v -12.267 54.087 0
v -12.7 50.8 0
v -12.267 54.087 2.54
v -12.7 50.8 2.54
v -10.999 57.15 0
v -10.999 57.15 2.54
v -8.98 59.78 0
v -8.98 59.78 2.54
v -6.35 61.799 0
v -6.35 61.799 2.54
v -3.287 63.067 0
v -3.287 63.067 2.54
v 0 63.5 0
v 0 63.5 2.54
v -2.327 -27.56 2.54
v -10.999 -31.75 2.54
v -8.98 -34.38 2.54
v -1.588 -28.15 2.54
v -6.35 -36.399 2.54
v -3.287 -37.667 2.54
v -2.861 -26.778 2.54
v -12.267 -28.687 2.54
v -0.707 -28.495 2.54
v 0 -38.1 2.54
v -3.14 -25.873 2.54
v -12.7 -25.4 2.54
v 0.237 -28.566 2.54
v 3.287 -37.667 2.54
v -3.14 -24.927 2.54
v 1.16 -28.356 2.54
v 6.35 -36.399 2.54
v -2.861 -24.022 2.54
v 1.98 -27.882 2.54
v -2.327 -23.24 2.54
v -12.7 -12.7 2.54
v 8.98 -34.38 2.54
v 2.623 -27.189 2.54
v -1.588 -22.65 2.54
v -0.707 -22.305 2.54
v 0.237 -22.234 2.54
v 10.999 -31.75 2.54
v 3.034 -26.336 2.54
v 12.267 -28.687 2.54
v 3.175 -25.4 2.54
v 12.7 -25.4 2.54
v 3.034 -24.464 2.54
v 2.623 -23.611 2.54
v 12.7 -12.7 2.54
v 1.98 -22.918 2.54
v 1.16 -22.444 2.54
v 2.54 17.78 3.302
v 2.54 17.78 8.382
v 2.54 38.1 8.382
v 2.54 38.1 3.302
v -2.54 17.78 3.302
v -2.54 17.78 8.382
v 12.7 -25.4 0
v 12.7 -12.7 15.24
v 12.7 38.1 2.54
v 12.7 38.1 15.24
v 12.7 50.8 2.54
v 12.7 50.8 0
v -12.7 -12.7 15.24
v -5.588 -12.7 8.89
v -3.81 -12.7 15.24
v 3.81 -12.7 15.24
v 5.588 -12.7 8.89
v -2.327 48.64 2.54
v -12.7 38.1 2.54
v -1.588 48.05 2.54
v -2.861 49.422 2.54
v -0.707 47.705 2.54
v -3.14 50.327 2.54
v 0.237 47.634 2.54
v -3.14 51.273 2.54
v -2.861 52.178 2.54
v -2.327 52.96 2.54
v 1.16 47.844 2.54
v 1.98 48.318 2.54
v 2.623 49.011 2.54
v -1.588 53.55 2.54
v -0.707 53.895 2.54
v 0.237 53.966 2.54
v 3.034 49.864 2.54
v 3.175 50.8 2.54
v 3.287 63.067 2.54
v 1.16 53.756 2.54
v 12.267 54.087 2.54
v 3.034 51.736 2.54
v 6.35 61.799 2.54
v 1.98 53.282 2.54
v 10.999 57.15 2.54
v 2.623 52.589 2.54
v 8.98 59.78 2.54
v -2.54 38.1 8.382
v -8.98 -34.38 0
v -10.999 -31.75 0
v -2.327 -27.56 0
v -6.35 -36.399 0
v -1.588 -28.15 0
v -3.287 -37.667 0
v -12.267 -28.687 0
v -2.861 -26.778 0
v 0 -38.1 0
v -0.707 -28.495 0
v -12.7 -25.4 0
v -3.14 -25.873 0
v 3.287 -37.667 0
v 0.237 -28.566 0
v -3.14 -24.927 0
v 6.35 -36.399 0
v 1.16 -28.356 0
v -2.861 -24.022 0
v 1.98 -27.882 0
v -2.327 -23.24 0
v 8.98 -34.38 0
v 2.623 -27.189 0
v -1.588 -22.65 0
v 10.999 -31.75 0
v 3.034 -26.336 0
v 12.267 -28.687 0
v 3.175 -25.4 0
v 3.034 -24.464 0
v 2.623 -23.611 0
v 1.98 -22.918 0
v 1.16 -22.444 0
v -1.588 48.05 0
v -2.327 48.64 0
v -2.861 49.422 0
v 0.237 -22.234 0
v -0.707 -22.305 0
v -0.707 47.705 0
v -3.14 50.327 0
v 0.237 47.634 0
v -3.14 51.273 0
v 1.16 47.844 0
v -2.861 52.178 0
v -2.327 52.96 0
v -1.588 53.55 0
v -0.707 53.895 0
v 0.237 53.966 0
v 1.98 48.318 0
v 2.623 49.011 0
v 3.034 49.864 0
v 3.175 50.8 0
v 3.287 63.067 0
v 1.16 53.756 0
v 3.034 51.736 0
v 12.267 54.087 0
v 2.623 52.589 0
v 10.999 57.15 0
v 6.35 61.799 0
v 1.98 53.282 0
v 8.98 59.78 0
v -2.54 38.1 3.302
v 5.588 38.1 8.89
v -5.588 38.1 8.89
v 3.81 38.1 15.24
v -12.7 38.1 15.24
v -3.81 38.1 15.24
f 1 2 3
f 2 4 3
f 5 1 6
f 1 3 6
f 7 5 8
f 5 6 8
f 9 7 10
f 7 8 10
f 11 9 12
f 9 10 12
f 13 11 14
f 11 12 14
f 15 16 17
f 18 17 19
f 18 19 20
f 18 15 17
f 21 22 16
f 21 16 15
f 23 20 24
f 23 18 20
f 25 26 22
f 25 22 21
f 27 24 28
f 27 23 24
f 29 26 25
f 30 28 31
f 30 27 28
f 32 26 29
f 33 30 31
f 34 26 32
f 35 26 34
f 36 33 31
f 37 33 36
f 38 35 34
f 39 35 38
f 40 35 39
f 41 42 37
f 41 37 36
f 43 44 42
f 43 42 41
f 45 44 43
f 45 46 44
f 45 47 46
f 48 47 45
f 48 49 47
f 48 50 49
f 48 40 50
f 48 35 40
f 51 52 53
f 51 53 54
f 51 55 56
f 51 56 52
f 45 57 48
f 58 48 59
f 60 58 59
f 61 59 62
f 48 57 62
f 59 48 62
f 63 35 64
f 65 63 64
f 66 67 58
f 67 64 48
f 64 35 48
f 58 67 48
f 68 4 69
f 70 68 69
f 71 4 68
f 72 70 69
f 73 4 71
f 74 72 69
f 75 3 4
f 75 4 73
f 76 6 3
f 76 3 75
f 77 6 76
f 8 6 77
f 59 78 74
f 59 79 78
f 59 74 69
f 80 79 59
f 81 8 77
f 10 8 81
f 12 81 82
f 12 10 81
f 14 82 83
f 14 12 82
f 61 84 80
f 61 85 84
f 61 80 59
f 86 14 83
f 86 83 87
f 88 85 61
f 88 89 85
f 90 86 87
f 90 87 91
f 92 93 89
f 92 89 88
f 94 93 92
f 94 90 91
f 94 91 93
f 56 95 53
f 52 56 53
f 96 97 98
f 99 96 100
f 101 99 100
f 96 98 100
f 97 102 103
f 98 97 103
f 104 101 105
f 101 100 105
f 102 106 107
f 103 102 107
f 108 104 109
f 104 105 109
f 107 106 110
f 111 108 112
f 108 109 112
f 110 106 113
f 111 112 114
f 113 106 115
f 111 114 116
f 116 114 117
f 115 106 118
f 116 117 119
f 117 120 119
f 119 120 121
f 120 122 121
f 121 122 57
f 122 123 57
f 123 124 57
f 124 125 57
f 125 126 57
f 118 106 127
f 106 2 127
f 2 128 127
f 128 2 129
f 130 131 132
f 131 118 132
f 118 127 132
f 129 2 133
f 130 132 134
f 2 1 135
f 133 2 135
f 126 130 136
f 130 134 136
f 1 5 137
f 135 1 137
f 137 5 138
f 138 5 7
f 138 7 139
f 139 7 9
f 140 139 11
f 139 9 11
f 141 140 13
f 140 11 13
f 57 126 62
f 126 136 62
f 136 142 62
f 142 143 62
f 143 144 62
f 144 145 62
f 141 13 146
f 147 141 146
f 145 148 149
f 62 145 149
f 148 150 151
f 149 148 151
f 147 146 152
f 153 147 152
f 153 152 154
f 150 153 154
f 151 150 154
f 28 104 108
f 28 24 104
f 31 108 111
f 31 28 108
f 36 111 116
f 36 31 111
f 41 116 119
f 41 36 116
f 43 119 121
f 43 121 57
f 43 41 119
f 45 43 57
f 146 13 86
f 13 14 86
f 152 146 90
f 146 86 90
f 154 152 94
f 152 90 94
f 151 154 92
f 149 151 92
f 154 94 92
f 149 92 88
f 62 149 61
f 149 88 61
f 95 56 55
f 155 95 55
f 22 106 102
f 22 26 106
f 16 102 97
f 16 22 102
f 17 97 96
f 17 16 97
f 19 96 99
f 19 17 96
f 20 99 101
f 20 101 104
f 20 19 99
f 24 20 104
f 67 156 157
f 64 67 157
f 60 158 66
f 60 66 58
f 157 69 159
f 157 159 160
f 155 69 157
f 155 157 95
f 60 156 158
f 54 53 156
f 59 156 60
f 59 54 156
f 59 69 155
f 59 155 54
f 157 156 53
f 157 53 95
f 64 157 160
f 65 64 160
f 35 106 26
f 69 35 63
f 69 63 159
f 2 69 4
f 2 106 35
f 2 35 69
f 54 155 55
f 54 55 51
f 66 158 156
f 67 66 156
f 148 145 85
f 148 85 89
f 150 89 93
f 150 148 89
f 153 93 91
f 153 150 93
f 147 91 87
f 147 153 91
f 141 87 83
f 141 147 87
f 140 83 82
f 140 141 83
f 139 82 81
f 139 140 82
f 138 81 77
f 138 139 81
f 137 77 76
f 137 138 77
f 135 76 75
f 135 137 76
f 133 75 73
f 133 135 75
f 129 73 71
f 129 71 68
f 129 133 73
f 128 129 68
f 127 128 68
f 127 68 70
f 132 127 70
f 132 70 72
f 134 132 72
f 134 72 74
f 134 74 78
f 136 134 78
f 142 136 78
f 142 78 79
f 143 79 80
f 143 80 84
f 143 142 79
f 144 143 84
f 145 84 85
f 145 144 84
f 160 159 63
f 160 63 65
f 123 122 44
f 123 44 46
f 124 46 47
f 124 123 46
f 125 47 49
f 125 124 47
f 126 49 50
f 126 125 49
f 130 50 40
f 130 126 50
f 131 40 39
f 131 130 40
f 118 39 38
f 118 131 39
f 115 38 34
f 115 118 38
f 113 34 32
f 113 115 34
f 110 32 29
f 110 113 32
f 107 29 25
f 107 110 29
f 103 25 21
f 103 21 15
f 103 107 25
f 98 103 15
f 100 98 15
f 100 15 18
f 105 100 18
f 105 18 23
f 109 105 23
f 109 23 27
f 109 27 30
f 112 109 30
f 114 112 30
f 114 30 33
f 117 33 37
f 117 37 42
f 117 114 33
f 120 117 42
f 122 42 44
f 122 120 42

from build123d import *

# Parameters (mm, degrees)
SKETCH1_W           = 25.4
SKETCH1_H           = 25.4
SKETCH1_R           = 3.175
SKETCH1_H_2         = 50.8
BOSS_EXTRUDE1_DEPTH = 2.54
SKETCH1_3_W         = 25.4
SKETCH1_3_H         = 50.8
BOSS_EXTRUDE2_DEPTH = 15.24
CUT_EXTRUDE1_DEPTH  = 79.74
FILLET1_R           = 12.7
SKETCH4_W           = 5.08
SKETCH4_H           = 5.08
CUT_EXTRUDE2_DEPTH  = 20.32


with BuildPart() as part:
    # Sketch1 → Boss-Extrude1 (new body)
    # profile 1 of 3: a face of its own
    with BuildSketch(Plane.XY):
        with Locations((0, 50.8)):
            Rectangle(SKETCH1_W, SKETCH1_H)
        with Locations((0, 50.8)):
            Circle(SKETCH1_R, mode=Mode.SUBTRACT)
    # profile 2 of 3: a face of its own
    with BuildSketch(Plane.XY):
        with Locations((0, 12.7)):
            Rectangle(SKETCH1_W, SKETCH1_H_2)
    # profile 3 of 3: a face of its own
    with BuildSketch(Plane.XY):
        with Locations((0, -25.4)):
            Rectangle(SKETCH1_W, SKETCH1_H)
        with Locations((0, -25.4)):
            Circle(SKETCH1_R, mode=Mode.SUBTRACT)
    extrude(amount=BOSS_EXTRUDE1_DEPTH)

    # Sketch1<3> → Boss-Extrude2 (add)
    with BuildSketch(Plane.XY):
        with Locations((0, 12.7)):
            Rectangle(SKETCH1_3_W, SKETCH1_3_H)
    extrude(amount=BOSS_EXTRUDE2_DEPTH)

    # Sketch3 → Cut-Extrude1 (cut, through all)
    with BuildSketch(Plane(origin=(0, 38.1, 0), x_dir=(1, 0, 0), z_dir=(0, 1, 0))):
        Polygon((-5.588, -8.89), (-3.81, -15.24), (3.81, -15.24), (5.588, -8.89), align=None)
    extrude(amount=-CUT_EXTRUDE1_DEPTH, mode=Mode.SUBTRACT)

    # Fillet1
    fillet1_edges = [part.edges().sort_by_distance(p)[0] for p in [
        (12.7, -38.1, 1.27),
        (-12.7, -38.1, 1.27),
        (12.7, 63.5, 1.27),
        (-12.7, 63.5, 1.27),
    ]]
    fillet(fillet1_edges, radius=FILLET1_R - 0.0001)  # a hair under: the kernel refuses the full size

    # Sketch4 → Cut-Extrude2 (cut)
    with BuildSketch(Plane(origin=(0, 38.1, 0), x_dir=(1, 0, 0), z_dir=(0, 1, 0))):
        with Locations((0, -5.842)):
            Rectangle(SKETCH4_W, SKETCH4_H)
    extrude(amount=-CUT_EXTRUDE2_DEPTH, mode=Mode.SUBTRACT)


solid = part.part
